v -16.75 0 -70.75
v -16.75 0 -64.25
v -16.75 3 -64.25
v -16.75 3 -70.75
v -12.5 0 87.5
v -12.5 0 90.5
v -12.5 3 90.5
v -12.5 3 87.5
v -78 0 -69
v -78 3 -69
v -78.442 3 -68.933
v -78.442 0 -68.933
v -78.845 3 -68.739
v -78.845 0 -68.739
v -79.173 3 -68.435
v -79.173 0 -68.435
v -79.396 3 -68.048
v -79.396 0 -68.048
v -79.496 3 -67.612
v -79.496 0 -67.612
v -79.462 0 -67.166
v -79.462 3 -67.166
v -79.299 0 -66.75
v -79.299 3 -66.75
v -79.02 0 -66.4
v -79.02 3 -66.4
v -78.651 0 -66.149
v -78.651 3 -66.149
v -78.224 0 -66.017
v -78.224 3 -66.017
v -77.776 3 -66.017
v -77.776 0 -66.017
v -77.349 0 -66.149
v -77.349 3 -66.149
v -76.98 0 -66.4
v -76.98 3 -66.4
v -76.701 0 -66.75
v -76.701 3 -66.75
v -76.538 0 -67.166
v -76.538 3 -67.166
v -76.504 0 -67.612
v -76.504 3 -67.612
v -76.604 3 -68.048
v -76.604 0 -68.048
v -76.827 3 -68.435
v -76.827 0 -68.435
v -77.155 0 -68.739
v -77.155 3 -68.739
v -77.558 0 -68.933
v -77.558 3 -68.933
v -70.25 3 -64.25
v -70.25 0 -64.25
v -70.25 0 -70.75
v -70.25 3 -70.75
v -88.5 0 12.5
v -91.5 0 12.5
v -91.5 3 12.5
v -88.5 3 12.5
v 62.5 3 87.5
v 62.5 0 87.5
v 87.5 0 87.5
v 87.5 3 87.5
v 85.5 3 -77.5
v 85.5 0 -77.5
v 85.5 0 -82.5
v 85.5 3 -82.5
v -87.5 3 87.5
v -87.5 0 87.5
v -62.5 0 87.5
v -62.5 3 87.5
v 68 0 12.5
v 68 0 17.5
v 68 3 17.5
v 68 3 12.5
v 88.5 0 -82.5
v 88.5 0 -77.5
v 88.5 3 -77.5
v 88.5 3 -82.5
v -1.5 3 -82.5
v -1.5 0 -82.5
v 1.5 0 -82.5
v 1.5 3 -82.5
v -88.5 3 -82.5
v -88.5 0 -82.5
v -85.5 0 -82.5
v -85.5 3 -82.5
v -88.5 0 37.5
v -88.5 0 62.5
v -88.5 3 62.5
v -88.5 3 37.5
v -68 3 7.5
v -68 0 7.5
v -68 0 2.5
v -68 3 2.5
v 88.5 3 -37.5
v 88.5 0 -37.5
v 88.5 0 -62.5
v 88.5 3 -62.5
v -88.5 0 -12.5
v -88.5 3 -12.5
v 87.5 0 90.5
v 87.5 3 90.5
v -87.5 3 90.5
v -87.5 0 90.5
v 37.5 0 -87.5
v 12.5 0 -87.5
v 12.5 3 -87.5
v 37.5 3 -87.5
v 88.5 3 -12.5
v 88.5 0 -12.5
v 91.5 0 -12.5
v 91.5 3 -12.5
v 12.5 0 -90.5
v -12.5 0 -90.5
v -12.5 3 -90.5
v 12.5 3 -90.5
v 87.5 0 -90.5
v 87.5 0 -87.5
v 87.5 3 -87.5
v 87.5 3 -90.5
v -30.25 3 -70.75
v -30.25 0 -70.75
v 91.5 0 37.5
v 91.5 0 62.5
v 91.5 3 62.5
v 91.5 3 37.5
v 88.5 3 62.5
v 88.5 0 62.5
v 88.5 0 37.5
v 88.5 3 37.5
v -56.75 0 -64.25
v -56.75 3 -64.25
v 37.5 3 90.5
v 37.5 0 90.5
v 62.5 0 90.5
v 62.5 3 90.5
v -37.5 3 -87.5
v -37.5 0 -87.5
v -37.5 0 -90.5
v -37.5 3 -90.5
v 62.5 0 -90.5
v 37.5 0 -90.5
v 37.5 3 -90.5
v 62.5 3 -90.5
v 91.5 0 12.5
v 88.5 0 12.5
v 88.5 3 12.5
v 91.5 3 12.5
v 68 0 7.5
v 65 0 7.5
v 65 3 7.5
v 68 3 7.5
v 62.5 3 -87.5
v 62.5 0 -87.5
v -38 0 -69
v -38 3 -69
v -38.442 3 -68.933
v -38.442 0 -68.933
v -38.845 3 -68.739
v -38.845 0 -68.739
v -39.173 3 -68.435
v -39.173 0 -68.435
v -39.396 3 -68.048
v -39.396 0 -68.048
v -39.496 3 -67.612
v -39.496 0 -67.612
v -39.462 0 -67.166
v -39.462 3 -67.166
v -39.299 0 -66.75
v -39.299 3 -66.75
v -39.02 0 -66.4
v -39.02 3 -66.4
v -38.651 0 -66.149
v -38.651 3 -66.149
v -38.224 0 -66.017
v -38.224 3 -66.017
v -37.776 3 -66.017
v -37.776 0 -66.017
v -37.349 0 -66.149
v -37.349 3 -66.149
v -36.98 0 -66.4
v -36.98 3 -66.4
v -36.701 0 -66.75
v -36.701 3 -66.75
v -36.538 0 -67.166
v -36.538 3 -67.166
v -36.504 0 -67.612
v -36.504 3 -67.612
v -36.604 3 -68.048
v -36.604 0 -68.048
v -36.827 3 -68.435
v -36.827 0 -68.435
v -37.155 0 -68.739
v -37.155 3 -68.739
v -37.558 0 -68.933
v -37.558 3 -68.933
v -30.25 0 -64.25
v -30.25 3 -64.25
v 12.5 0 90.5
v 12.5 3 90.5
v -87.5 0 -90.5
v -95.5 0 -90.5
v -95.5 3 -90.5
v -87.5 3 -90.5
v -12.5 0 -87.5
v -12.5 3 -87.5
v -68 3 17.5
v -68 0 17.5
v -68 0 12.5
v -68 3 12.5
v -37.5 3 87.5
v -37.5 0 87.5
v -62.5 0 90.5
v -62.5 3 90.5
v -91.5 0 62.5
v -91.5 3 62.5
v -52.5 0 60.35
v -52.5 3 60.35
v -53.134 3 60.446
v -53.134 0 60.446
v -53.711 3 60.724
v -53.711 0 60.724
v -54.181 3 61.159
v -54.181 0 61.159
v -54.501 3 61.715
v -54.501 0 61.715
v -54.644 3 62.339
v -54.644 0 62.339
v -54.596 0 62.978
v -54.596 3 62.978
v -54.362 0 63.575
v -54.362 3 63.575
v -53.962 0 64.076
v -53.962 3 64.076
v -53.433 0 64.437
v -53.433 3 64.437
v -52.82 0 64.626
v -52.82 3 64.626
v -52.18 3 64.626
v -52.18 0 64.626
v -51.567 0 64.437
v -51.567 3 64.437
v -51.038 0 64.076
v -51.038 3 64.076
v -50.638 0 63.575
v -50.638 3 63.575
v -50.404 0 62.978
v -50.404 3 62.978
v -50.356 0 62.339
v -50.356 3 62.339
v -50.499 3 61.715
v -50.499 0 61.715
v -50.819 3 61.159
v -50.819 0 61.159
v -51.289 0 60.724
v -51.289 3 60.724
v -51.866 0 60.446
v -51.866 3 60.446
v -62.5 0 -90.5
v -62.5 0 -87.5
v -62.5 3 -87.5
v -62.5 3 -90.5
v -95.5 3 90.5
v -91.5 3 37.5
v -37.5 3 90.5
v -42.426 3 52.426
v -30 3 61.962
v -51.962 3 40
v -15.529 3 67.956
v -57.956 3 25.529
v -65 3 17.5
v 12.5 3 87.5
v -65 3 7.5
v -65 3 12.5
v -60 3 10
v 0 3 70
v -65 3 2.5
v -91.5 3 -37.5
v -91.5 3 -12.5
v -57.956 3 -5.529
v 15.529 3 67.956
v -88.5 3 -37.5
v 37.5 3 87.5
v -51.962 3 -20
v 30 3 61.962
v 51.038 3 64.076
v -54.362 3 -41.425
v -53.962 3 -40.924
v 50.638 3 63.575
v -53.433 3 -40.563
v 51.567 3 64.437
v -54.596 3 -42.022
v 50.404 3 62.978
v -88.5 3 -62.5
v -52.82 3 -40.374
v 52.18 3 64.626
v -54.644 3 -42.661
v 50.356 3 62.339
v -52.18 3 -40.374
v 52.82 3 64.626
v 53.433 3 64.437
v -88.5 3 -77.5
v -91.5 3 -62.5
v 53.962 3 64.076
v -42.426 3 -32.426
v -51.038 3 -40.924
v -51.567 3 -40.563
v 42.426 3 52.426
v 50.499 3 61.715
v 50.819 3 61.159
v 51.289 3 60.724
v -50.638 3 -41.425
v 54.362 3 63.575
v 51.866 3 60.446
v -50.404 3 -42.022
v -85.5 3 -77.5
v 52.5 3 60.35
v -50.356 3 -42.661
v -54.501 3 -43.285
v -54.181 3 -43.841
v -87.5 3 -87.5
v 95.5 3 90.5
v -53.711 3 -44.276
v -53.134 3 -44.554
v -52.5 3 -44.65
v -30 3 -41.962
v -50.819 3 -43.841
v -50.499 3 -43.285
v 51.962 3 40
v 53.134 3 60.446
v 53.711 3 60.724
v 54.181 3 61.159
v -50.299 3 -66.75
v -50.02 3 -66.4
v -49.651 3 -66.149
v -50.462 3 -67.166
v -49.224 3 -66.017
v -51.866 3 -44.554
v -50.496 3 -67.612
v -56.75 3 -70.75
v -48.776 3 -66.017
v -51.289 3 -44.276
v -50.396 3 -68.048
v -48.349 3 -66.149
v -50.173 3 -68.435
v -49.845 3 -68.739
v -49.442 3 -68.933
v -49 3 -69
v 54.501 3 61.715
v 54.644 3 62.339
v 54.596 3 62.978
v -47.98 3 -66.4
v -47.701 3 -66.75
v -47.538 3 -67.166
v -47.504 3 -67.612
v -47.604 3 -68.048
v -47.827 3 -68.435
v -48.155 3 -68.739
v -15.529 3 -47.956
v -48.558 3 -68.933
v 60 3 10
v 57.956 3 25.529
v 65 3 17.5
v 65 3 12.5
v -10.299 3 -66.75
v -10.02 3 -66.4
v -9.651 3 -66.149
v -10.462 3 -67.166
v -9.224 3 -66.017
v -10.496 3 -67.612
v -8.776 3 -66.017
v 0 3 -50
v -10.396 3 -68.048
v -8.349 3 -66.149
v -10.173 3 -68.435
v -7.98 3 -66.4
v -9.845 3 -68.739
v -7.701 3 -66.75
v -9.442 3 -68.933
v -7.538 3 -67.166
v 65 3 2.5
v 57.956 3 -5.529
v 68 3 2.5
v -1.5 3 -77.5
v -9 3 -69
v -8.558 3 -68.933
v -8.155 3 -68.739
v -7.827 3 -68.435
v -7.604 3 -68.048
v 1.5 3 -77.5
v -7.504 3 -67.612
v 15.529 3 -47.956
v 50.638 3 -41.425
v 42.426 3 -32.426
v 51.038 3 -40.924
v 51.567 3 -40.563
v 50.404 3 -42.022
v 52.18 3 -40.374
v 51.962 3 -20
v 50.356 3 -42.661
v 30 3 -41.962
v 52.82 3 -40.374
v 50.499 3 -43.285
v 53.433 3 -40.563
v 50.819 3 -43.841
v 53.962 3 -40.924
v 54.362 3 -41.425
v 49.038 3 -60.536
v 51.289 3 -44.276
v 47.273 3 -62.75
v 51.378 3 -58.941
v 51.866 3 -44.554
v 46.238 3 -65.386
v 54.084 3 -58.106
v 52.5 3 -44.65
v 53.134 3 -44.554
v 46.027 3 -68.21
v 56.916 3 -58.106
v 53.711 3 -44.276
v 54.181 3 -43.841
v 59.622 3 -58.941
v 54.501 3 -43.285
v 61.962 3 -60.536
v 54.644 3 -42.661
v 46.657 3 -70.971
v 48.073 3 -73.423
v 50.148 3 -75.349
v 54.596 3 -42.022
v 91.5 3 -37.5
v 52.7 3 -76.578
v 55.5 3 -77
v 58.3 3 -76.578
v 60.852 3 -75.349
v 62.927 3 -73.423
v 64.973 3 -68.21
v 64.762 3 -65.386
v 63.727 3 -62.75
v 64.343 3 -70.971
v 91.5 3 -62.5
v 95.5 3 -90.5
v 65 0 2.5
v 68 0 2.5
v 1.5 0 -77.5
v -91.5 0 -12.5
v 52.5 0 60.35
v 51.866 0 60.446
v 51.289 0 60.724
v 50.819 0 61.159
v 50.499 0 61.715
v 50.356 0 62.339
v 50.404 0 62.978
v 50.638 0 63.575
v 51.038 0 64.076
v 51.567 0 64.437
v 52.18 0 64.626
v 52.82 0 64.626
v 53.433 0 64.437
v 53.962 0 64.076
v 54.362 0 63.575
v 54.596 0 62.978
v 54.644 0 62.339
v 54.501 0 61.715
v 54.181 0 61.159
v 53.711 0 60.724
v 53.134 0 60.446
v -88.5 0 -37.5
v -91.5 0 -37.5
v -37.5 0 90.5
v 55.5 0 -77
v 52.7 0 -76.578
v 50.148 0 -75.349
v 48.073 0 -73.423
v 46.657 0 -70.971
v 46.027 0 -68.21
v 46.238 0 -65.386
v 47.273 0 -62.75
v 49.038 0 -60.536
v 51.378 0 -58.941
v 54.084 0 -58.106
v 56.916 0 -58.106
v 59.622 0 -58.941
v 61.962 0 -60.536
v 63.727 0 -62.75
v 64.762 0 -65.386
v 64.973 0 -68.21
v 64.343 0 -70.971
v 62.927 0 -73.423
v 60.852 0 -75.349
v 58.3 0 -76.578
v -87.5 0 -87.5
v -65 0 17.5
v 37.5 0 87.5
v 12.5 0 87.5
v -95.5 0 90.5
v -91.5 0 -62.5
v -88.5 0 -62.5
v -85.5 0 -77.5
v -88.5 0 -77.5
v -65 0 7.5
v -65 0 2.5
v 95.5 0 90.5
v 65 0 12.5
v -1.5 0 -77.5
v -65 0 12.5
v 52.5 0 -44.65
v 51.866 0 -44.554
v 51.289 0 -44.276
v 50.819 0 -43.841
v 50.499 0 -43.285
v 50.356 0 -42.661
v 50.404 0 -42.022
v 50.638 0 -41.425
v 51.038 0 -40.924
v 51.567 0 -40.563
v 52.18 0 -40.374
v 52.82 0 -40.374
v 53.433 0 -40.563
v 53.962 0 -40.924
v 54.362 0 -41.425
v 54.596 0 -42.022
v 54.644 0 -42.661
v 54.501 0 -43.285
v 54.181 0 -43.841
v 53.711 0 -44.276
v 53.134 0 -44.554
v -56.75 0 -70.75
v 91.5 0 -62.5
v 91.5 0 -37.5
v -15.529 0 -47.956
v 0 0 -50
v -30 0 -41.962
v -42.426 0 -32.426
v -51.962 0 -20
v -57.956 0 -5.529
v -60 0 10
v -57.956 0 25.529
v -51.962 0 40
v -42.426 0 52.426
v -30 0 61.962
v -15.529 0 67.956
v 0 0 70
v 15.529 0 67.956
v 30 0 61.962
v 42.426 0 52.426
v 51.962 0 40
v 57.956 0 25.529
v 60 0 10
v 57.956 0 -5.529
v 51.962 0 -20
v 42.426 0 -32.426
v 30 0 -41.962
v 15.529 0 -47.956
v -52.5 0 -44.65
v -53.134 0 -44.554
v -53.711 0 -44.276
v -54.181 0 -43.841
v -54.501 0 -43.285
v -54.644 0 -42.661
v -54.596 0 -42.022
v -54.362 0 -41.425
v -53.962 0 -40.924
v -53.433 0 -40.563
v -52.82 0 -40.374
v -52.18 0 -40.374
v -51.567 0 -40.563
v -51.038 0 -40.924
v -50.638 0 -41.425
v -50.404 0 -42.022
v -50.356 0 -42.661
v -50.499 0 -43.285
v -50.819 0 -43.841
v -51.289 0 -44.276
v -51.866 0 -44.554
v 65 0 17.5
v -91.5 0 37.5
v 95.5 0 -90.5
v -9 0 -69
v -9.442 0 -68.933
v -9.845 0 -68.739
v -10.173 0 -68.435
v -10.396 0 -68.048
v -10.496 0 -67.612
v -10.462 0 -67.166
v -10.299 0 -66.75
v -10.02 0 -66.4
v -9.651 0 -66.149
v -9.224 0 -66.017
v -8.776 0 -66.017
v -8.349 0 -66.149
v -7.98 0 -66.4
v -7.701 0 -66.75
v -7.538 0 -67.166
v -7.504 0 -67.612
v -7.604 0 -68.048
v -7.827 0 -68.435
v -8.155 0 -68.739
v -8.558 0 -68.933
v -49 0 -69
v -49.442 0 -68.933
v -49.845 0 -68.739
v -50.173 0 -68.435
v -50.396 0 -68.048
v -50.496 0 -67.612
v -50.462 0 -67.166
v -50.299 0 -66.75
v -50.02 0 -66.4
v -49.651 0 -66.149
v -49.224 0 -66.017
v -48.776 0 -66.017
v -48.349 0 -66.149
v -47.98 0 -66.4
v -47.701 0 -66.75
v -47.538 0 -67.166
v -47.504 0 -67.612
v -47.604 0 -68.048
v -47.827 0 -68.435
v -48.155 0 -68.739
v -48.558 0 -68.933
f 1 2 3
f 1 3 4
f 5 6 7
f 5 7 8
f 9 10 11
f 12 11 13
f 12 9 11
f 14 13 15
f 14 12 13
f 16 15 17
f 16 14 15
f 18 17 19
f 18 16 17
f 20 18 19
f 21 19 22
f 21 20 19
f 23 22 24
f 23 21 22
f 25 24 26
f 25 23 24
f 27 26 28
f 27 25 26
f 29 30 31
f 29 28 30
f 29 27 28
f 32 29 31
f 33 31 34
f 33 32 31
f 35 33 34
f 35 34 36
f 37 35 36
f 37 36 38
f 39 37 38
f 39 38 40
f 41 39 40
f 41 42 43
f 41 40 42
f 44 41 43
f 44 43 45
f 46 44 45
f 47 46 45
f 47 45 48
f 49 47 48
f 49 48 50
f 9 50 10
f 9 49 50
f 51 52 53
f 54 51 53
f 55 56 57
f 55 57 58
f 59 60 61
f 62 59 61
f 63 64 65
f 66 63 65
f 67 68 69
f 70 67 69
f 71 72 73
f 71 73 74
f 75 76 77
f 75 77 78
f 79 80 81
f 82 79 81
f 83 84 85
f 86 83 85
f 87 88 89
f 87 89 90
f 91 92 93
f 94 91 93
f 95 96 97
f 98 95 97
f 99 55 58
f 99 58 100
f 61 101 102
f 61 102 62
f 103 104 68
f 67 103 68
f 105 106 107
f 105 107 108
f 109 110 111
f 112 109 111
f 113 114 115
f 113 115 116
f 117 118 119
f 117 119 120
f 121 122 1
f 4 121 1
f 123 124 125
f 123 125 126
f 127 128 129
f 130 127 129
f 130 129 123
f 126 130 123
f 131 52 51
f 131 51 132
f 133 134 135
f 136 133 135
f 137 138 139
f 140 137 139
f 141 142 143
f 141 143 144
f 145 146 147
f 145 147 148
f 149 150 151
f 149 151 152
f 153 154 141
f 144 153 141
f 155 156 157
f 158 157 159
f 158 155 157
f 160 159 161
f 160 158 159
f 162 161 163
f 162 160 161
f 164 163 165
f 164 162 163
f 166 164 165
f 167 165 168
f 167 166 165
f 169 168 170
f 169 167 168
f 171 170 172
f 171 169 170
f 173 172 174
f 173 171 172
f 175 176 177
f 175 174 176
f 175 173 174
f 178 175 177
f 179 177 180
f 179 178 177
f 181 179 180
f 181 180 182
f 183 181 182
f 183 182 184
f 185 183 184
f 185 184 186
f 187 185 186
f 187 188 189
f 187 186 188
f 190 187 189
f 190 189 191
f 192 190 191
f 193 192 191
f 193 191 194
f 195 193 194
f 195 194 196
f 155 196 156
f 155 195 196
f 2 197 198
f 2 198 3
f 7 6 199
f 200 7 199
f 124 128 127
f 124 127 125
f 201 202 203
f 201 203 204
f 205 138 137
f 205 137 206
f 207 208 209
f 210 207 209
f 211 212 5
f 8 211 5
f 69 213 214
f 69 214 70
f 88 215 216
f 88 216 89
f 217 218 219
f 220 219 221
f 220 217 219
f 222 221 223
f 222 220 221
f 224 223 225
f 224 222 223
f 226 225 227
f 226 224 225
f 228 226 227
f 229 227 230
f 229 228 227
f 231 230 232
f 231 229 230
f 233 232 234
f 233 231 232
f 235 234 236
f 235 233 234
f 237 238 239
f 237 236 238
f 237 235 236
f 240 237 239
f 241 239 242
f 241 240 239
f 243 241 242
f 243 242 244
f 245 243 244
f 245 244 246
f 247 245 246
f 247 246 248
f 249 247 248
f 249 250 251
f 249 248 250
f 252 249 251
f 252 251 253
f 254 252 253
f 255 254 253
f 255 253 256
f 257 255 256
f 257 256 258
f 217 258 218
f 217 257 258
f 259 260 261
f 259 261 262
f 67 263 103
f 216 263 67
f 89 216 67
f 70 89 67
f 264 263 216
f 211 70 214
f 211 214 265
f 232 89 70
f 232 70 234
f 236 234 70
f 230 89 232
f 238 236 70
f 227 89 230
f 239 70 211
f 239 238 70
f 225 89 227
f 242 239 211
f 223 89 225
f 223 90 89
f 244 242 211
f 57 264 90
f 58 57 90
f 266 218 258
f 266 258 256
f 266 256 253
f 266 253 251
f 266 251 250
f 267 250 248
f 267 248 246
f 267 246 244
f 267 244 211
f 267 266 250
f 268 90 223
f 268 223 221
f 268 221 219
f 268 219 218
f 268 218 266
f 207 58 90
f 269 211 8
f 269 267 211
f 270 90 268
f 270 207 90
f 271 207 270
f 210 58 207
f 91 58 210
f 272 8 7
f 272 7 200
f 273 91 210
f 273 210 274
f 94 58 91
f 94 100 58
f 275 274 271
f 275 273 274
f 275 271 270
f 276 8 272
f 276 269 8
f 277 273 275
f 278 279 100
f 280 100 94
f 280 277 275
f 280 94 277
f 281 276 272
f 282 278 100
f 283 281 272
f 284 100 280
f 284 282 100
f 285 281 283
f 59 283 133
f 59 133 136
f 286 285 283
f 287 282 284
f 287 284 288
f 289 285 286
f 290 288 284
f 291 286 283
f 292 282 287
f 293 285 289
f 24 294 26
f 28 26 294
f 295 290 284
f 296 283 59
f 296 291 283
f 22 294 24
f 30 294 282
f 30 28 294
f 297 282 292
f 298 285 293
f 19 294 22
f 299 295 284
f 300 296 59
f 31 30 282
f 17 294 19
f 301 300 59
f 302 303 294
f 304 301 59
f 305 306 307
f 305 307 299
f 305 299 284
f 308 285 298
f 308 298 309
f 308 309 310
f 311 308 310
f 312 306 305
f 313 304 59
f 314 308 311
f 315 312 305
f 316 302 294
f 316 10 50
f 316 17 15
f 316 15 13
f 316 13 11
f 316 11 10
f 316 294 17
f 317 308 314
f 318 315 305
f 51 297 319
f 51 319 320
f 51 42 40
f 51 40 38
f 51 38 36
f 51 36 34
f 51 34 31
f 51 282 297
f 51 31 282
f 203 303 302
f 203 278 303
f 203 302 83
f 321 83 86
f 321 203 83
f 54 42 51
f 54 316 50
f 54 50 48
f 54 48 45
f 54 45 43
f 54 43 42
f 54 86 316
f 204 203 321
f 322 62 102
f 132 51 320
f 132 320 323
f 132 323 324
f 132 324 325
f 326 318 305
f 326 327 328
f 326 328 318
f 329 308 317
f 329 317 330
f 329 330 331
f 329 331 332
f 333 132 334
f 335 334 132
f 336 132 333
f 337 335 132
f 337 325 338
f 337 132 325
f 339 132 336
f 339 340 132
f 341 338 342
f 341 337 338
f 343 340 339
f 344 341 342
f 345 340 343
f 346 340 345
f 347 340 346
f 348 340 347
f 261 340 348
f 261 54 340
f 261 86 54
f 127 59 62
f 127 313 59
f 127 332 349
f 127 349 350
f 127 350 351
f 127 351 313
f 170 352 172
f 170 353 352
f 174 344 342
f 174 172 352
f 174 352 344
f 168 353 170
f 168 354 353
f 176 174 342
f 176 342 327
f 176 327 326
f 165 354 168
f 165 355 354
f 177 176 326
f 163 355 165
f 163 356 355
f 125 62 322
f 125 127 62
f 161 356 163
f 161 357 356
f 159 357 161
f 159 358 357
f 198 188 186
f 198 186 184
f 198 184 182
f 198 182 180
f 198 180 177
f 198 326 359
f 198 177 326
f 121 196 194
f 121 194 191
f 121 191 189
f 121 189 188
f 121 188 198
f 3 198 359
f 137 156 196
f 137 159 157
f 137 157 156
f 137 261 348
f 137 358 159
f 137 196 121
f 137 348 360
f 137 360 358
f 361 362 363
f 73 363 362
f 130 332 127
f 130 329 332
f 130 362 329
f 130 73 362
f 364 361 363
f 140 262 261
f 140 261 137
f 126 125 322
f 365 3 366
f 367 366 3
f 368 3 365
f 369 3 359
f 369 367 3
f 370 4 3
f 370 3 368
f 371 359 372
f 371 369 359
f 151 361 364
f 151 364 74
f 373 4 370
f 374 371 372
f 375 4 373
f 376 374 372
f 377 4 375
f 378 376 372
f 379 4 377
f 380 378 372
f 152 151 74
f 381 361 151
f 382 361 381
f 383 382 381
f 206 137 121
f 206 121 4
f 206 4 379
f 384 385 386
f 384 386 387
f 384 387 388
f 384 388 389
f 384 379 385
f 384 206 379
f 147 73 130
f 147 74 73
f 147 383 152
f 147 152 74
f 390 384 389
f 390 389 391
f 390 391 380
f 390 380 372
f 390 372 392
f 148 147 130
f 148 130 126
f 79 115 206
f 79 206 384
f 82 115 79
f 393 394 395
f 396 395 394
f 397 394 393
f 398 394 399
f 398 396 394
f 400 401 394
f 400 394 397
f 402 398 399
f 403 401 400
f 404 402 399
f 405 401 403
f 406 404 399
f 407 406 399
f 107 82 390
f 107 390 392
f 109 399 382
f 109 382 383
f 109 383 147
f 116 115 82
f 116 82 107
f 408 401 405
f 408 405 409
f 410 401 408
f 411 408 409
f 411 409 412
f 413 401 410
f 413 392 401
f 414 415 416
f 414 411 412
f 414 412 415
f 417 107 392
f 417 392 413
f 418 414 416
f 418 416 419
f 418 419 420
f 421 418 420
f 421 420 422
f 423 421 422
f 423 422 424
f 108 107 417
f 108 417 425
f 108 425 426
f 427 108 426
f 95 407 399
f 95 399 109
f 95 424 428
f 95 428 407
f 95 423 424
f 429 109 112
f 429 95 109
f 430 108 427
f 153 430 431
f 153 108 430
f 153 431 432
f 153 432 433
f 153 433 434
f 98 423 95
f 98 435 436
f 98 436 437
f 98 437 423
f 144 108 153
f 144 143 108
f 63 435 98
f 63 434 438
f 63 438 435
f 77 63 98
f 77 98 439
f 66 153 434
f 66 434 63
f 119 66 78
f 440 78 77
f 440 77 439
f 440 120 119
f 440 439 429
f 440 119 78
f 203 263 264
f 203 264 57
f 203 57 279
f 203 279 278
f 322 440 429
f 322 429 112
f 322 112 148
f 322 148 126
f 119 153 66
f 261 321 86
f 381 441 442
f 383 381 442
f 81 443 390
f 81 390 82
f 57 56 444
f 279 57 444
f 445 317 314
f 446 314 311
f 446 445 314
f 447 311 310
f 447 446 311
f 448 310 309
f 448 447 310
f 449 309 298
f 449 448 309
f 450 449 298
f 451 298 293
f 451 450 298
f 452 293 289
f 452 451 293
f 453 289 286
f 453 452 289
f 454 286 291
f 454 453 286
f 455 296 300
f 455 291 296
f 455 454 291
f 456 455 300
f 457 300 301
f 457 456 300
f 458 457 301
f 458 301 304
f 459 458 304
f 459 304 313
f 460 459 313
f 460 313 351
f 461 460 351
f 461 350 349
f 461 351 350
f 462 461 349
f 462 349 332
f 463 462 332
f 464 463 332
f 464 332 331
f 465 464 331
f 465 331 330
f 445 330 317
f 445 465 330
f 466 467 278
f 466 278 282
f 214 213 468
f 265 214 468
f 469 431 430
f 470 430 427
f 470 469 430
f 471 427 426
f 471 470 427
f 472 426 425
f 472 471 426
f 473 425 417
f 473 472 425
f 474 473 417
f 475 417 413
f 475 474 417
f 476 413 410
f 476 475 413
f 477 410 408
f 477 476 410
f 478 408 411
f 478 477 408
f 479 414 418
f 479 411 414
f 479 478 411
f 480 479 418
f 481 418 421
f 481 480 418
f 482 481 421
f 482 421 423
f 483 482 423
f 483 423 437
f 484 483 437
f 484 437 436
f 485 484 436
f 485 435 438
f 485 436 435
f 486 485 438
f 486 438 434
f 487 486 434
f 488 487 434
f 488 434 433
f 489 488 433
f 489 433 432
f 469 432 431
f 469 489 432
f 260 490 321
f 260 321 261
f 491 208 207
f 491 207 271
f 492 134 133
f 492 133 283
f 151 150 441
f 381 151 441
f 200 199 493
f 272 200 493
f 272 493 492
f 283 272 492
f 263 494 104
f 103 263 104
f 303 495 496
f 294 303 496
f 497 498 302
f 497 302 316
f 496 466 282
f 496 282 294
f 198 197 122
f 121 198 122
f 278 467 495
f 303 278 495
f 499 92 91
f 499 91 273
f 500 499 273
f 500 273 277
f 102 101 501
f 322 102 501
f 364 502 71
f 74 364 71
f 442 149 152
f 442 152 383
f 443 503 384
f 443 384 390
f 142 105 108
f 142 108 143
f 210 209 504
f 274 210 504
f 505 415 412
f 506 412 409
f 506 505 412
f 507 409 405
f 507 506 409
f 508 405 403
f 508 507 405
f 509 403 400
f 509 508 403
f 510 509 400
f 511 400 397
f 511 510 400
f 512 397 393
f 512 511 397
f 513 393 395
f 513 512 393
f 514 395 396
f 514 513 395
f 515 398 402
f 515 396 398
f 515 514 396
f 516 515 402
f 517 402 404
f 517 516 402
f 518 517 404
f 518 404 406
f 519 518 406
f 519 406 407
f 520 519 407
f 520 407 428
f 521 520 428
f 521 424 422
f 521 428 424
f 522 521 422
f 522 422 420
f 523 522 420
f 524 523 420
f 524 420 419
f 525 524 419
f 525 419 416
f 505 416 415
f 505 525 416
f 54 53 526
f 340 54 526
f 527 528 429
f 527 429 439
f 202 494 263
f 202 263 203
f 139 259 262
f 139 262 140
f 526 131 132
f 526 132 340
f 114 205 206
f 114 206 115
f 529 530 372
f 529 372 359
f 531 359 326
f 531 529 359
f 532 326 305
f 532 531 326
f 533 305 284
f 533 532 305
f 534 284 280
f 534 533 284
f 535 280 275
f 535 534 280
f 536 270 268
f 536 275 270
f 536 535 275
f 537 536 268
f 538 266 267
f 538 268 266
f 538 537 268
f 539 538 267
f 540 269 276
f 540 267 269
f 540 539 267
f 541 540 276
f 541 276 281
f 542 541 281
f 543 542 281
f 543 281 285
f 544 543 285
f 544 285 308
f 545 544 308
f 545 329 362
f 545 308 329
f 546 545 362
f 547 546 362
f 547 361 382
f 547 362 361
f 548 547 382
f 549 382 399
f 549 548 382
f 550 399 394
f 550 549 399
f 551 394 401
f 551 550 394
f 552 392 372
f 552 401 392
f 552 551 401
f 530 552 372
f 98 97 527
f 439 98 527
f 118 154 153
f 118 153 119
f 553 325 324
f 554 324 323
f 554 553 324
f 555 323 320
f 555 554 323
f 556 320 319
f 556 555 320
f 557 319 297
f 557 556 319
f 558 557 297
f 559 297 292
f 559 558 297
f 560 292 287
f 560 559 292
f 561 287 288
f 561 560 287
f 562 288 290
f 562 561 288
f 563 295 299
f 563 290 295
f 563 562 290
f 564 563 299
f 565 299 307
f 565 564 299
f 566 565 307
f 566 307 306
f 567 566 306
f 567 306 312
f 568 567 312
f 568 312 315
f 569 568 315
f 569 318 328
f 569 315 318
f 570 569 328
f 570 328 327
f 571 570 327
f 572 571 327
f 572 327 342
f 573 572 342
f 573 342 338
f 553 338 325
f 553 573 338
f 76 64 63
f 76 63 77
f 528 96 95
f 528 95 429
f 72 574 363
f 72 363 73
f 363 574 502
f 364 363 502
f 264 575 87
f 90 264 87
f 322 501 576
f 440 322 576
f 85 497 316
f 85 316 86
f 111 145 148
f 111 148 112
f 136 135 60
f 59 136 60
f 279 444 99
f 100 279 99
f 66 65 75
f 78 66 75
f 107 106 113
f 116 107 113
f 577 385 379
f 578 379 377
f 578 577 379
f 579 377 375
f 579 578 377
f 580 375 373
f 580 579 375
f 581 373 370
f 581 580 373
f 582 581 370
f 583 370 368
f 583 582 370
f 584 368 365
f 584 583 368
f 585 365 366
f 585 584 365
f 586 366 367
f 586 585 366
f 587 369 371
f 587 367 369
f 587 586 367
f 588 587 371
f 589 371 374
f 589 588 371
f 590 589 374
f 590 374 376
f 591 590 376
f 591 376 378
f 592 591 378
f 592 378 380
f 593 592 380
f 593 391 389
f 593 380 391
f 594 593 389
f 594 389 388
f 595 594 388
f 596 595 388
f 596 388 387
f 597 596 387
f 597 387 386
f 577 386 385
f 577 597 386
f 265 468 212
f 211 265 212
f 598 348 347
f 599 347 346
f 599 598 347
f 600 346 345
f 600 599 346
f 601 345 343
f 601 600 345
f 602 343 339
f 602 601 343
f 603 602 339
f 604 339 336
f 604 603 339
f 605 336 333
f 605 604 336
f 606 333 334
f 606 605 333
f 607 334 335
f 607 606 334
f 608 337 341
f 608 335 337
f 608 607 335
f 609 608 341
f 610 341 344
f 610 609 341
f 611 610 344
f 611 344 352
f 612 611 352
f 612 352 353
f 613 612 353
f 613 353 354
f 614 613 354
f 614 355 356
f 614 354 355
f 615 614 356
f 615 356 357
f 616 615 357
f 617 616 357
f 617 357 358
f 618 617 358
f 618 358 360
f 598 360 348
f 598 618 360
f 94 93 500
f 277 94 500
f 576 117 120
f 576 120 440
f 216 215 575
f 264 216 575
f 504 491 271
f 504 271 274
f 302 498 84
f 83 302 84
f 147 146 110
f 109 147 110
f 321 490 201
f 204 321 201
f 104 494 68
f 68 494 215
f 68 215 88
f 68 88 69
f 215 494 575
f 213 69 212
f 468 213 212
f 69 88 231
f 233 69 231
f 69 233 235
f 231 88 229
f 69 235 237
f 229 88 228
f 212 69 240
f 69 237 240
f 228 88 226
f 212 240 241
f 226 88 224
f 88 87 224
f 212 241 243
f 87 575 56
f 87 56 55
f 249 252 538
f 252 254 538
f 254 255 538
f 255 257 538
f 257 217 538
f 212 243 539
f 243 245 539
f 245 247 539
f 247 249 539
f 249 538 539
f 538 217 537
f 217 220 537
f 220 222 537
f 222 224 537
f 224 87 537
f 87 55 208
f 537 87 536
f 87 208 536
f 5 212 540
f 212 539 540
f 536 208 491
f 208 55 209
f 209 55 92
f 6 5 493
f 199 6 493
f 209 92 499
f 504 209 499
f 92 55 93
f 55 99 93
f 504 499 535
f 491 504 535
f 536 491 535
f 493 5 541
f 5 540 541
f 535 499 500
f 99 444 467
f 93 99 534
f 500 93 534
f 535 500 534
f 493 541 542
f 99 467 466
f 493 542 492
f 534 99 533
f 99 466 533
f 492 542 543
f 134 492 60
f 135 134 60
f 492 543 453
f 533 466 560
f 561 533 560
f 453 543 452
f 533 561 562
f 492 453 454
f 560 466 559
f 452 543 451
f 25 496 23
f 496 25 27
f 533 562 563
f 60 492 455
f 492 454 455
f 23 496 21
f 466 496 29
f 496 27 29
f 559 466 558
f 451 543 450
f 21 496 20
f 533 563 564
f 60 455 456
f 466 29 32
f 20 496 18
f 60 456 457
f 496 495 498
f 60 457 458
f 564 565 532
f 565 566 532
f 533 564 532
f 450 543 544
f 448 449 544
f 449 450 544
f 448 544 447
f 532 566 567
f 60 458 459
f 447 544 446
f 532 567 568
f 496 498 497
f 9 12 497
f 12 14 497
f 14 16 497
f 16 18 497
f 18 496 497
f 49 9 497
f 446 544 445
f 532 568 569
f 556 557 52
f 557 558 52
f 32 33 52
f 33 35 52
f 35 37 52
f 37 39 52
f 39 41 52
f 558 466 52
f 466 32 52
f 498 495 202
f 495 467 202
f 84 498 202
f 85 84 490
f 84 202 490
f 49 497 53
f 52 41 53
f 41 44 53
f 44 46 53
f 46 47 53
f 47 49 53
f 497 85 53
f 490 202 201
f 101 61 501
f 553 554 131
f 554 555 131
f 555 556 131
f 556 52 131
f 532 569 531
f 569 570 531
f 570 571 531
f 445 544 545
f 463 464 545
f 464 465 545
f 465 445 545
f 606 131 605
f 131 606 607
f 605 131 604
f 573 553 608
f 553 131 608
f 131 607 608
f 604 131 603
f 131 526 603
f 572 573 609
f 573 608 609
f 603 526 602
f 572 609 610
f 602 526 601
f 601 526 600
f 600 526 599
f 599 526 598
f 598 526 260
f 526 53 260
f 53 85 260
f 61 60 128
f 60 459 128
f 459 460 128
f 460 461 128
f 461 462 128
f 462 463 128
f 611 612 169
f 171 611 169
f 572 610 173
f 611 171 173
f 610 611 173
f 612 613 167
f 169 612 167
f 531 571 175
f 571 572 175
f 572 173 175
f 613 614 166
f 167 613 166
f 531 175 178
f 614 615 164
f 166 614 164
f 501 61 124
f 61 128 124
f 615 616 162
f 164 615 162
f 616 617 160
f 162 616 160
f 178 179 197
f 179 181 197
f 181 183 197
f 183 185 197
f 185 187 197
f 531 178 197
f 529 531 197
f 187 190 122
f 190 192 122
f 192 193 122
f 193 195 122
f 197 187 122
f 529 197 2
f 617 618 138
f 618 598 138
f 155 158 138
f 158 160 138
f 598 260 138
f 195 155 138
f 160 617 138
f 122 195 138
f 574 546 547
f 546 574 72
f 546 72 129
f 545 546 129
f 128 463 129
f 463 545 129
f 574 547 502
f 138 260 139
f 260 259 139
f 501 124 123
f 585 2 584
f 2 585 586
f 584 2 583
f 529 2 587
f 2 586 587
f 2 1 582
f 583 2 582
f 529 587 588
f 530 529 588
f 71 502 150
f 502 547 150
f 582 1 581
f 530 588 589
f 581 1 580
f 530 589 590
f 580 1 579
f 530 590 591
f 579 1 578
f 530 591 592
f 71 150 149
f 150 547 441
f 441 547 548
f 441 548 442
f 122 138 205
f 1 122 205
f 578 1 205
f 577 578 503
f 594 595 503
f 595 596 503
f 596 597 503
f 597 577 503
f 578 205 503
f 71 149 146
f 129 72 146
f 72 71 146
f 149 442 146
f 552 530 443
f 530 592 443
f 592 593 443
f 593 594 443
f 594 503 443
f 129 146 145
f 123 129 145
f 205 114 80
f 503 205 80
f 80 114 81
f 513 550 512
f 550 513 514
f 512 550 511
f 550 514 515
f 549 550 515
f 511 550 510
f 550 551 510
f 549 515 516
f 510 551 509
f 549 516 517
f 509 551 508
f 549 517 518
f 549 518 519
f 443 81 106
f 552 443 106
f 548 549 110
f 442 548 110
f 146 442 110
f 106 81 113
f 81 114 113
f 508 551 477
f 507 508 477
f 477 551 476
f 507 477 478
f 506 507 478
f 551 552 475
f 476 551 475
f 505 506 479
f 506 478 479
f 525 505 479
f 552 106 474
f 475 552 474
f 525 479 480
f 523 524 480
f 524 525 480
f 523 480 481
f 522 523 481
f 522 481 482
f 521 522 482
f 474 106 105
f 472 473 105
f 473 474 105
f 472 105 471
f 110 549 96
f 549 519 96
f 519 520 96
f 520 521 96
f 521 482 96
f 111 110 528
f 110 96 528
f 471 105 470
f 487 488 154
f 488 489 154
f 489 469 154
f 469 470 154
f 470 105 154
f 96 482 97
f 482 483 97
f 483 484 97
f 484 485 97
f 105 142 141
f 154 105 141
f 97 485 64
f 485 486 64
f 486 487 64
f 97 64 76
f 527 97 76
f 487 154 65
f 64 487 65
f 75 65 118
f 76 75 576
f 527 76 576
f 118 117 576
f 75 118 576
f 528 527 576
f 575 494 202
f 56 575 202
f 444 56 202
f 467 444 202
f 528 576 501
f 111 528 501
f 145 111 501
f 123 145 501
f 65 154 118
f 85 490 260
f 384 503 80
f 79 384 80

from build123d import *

# Parameters (mm, degrees)
SKICA1_W                  = 191
SKICA1_H                  = 175
P_IDAT_VYSUNUT_M1_DEPTH   = 3
SKICA13_W                 = 25
SKICA13_H                 = 3
SKICA13_W_2               = 8
P_IDAT_VYSUNUT_M5_DEPTH   = 3
SKICA14_W                 = 3
SKICA14_H                 = 5
ODEBRAT_VYSUNUT_M7_DEPTH  = 132.60357138
SKICA15_W                 = 3
SKICA15_H                 = 25
ODEBRAT_VYSUNUT_M8_DEPTH  = 132.60357138
SKICA16_W                 = 3
SKICA16_H                 = 5
ODEBRAT_VYSUNUT_M9_DEPTH  = 132.60357138
SKICA4_R                  = 2.15
SKICA4_R_2                = 60
ODEBRAT_VYSUNUT_M5_DEPTH  = 132.60357138
SKICA5_R                  = 9.5
ODEBRAT_VYSUNUT_M6_DEPTH  = 132.60357138
SKICA17_R                 = 1.5
SKICA17_W                 = 13.5
SKICA17_H                 = 6.5
ODEBRAT_VYSUNUT_M10_DEPTH = 132.60357138


with BuildPart() as part:
    # Skica1 → Přidat vysunutím1 (new body)
    with BuildSketch(Plane(origin=(0, 0, 0), x_dir=(1, 0, 0), z_dir=(0, 1, 0))):
        Rectangle(SKICA1_W, SKICA1_H)
    extrude(amount=P_IDAT_VYSUNUT_M1_DEPTH)

    # Skica13 → Přidat vysunutím5 (add)
    with BuildSketch(Plane(origin=(0, 0, 0), x_dir=(1, 0, 0), z_dir=(0, 1, 0))):
        with Locations((-50, 89)):
            Rectangle(SKICA13_W, SKICA13_H)
        with Locations((0, 89)):
            Rectangle(SKICA13_W, SKICA13_H)
        with Locations((50, 89)):
            Rectangle(SKICA13_W, SKICA13_H)
        with Locations((50, -89)):
            Rectangle(SKICA13_W, SKICA13_H)
        with Locations((0, -89)):
            Rectangle(SKICA13_W, SKICA13_H)
        with Locations((-50, -89)):
            Rectangle(SKICA13_W, SKICA13_H)
        with Locations((-91.5, 89)):
            Rectangle(SKICA13_W_2, SKICA13_H)
        with Locations((91.5, -89)):
            Rectangle(SKICA13_W_2, SKICA13_H)
        with Locations((91.5, 89)):
            Rectangle(SKICA13_W_2, SKICA13_H)
        with Locations((-91.5, -89)):
            Rectangle(SKICA13_W_2, SKICA13_H)
    extrude(amount=P_IDAT_VYSUNUT_M5_DEPTH)

    # Skica14 → Odebrat vysunutím7 (cut, through all)
    with BuildSketch(Plane(origin=(0, 0, 0), x_dir=(1, 0, 0), z_dir=(0, 1, 0))):
        with Locations((87, 80)):
            Rectangle(SKICA14_W, SKICA14_H)
        with Locations((0, 80)):
            Rectangle(SKICA14_W, SKICA14_H)
        with Locations((-87, 80)):
            Rectangle(SKICA14_W, SKICA14_H)
    extrude(amount=ODEBRAT_VYSUNUT_M7_DEPTH, mode=Mode.SUBTRACT)

    # Skica15 → Odebrat vysunutím8 (cut, through all)
    with BuildSketch(Plane(origin=(0, 0, 0), x_dir=(1, 0, 0), z_dir=(0, 1, 0))):
        with Locations((-90, 50)):
            Rectangle(SKICA15_W, SKICA15_H)
        with Locations((-90, 0)):
            Rectangle(SKICA15_W, SKICA15_H)
        with Locations((-90, -50)):
            Rectangle(SKICA15_W, SKICA15_H)
        with Locations((90, -50)):
            Rectangle(SKICA15_W, SKICA15_H)
        with Locations((90, 0)):
            Rectangle(SKICA15_W, SKICA15_H)
        with Locations((90, 50)):
            Rectangle(SKICA15_W, SKICA15_H)
    extrude(amount=ODEBRAT_VYSUNUT_M8_DEPTH, mode=Mode.SUBTRACT)

    # Skica16 → Odebrat vysunutím9 (cut, through all)
    with BuildSketch(Plane(origin=(0, 0, 0), x_dir=(1, 0, 0), z_dir=(0, 1, 0))):
        with Locations((-66.5, -5)):
            Rectangle(SKICA16_W, SKICA16_H)
        with Locations((-66.5, -15)):
            Rectangle(SKICA16_W, SKICA16_H)
        with Locations((66.5, -15)):
            Rectangle(SKICA16_W, SKICA16_H)
        with Locations((66.5, -5)):
            Rectangle(SKICA16_W, SKICA16_H)
    extrude(amount=ODEBRAT_VYSUNUT_M9_DEPTH, mode=Mode.SUBTRACT)

    # Skica4 → Odebrat vysunutím5 (cut, through all)
    with BuildSketch(Plane(origin=(0, 0, 0), x_dir=(1, 0, 0), z_dir=(0, 1, 0))):
        with Locations(Location((-52.5, -62.5, 0), (0, 0, 90))):
            Circle(SKICA4_R)
        with Locations(Location((52.5, 42.5, 0), (0, 0, 90))):
            Circle(SKICA4_R)
        with Locations(Location((0, -10, 0), (0, 0, 90))):
            Circle(SKICA4_R_2)
        with Locations(Location((-52.5, 42.5, 0), (0, 0, 90))):
            Circle(SKICA4_R)
        with Locations(Location((52.5, -62.5, 0), (0, 0, 90))):
            Circle(SKICA4_R)
    extrude(amount=ODEBRAT_VYSUNUT_M5_DEPTH, mode=Mode.SUBTRACT)

    # Skica5 → Odebrat vysunutím6 (cut, through all)
    with BuildSketch(Plane(origin=(0, 0, 0), x_dir=(1, 0, 0), z_dir=(0, 1, 0))):
        with Locations(Location((55.5, 67.5, 0), (0, 0, 90))):
            Circle(SKICA5_R)
    extrude(amount=ODEBRAT_VYSUNUT_M6_DEPTH, mode=Mode.SUBTRACT)

    # Skica17 → Odebrat vysunutím10 (cut, through all)
    with BuildSketch(Plane(origin=(0, 0, 0), x_dir=(1, 0, 0), z_dir=(0, 1, 0))):
        with Locations(Location((-78, 67.5, 0), (0, 0, 90))):
            Circle(SKICA17_R)
        with Locations(Location((-49, 67.5, 0), (0, 0, 90))):
            Circle(SKICA17_R)
        with Locations(Location((-38, 67.5, 0), (0, 0, 90))):
            Circle(SKICA17_R)
        with Locations(Location((-9, 67.5, 0), (0, 0, 90))):
            Circle(SKICA17_R)
        with Locations((-63.5, 67.5)):
            Rectangle(SKICA17_W, SKICA17_H)
        with Locations((-23.5, 67.5)):
            Rectangle(SKICA17_W, SKICA17_H)
    extrude(amount=ODEBRAT_VYSUNUT_M10_DEPTH, mode=Mode.SUBTRACT)


solid = part.part
